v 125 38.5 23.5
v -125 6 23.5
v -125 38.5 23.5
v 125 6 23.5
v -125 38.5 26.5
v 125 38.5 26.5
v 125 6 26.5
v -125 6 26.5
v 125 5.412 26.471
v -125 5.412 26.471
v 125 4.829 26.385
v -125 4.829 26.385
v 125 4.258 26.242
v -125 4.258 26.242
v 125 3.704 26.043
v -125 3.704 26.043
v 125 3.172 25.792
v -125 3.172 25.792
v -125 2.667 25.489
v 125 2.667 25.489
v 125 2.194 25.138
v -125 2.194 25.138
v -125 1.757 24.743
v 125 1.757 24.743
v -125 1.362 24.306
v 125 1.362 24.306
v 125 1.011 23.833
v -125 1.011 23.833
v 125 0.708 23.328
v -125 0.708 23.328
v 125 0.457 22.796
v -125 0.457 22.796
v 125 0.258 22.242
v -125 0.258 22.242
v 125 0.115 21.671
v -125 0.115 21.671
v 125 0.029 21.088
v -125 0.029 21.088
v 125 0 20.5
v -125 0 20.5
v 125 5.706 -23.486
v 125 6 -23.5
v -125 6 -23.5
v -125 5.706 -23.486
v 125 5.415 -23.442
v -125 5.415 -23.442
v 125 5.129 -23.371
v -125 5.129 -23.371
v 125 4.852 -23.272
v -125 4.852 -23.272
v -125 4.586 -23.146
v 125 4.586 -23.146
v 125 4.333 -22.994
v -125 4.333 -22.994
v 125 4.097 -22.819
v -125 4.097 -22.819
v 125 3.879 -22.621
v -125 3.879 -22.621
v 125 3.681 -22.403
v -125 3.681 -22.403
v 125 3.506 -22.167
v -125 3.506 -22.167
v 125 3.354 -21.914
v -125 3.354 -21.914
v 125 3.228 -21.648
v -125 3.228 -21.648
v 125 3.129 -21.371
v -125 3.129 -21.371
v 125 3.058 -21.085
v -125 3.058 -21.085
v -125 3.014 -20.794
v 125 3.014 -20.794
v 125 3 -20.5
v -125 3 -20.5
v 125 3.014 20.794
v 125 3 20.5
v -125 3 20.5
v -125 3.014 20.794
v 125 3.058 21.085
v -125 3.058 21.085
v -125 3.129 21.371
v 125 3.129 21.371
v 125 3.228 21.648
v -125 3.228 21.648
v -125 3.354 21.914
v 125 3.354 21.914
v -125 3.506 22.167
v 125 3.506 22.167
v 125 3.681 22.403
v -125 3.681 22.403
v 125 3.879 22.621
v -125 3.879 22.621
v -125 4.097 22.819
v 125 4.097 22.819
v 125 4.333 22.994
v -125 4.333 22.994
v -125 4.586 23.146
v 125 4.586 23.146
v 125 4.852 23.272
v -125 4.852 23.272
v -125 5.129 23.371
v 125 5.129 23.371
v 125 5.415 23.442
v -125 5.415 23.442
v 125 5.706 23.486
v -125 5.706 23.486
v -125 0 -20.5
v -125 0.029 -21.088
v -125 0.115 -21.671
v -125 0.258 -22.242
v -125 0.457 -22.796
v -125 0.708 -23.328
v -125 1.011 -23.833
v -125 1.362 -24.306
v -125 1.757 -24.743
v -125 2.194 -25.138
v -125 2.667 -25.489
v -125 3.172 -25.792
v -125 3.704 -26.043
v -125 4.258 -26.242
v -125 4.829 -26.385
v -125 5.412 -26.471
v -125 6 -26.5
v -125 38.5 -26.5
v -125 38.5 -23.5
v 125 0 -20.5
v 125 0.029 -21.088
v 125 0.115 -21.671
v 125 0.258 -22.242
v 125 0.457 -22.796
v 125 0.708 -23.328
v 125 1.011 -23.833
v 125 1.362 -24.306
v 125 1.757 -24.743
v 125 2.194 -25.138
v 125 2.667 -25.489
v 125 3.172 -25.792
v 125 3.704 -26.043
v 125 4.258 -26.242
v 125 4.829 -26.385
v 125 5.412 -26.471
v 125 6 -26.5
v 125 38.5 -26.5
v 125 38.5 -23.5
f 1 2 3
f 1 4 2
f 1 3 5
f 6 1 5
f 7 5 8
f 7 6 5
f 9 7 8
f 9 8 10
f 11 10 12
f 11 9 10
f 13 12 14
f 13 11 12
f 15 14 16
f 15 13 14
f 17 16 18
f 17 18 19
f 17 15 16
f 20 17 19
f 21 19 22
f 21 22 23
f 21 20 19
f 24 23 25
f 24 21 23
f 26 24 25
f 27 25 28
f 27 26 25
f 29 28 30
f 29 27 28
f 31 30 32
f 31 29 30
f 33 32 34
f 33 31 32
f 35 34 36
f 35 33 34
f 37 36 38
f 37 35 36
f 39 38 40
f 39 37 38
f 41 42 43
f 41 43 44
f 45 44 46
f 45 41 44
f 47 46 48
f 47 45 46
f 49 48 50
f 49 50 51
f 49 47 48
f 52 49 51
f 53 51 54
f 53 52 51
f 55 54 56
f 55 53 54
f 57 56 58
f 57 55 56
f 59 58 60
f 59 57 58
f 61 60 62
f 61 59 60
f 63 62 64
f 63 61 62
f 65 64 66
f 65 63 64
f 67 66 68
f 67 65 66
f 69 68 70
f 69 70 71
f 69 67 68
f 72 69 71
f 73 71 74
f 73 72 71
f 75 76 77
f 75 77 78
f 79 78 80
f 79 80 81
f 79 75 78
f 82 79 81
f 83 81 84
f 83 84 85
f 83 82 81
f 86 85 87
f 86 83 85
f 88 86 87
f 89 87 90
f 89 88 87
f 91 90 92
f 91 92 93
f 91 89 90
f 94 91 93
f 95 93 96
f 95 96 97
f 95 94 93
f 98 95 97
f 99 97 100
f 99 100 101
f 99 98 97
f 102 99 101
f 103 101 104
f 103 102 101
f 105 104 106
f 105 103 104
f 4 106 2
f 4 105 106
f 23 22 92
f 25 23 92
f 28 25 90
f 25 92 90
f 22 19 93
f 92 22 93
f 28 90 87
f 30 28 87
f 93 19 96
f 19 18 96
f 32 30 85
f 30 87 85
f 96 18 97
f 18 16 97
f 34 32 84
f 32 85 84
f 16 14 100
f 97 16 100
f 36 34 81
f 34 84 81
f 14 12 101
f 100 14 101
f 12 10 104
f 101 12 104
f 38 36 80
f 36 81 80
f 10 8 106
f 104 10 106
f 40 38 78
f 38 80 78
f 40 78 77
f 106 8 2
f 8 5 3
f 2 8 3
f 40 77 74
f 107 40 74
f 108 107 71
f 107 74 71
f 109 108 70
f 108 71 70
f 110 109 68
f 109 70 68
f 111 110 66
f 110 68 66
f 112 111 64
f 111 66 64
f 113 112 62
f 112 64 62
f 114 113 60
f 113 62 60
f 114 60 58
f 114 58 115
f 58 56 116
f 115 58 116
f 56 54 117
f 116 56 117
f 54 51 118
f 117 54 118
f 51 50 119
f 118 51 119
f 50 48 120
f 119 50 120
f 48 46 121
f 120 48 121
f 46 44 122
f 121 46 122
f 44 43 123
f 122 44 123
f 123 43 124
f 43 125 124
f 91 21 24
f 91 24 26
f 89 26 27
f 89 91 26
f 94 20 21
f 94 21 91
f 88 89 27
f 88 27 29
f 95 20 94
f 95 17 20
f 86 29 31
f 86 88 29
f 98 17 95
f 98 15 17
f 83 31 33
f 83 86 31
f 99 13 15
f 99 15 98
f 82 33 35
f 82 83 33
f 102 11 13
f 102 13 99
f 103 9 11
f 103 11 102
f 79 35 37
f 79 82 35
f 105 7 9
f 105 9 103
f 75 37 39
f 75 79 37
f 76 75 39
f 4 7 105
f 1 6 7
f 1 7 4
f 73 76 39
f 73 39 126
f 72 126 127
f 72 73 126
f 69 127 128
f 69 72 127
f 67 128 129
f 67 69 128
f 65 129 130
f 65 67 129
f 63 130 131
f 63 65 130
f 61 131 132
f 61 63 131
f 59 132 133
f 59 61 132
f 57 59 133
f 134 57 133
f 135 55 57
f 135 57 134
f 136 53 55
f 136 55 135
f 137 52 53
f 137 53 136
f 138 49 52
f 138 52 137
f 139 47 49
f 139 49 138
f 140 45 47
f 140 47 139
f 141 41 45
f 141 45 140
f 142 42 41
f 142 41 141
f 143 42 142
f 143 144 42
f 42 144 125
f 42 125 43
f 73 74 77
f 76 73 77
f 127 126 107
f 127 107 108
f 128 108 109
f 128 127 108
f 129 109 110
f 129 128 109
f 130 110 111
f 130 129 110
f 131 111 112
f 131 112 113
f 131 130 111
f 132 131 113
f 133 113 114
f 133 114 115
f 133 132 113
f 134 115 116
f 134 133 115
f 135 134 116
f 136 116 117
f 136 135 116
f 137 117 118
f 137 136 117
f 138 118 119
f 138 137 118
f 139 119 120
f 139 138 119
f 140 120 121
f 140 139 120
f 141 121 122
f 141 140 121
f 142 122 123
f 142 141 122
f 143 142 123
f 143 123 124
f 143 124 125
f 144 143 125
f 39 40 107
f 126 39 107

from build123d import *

# Parameters (mm, degrees)
TRACK_DEPTH = 125


with BuildPart() as part:
    # 草图1 → Track (new, symmetric)
    with BuildSketch(Plane(origin=(0, 0, 0), x_dir=(0, 0, -1), z_dir=(1, 0, 0))):
        with BuildLine():
            Line((-26.5, 38.5), (-26.5, 6))
            ThreePointArc((-26.5, 6), (-24.742640687, 1.757359313), (-20.5, 0))
            Line((-20.5, 0), (20.5, 0))
            ThreePointArc((20.5, 0), (24.742640687, 1.757359313), (26.5, 6))
            Line((26.5, 6), (26.5, 38.5))
            Line((26.5, 38.5), (23.5, 38.5))
            Line((23.5, 38.5), (23.5, 6))
            ThreePointArc((23.5, 6), (22.621320344, 3.878679656), (20.5, 3))
            Line((20.5, 3), (-20.5, 3))
            ThreePointArc((-20.5, 3), (-22.621320344, 3.878679656), (-23.5, 6))
            Line((-23.5, 6), (-23.5, 38.5))
            Line((-23.5, 38.5), (-26.5, 38.5))
        make_face()
    extrude(amount=TRACK_DEPTH, both=True)


solid = part.part
